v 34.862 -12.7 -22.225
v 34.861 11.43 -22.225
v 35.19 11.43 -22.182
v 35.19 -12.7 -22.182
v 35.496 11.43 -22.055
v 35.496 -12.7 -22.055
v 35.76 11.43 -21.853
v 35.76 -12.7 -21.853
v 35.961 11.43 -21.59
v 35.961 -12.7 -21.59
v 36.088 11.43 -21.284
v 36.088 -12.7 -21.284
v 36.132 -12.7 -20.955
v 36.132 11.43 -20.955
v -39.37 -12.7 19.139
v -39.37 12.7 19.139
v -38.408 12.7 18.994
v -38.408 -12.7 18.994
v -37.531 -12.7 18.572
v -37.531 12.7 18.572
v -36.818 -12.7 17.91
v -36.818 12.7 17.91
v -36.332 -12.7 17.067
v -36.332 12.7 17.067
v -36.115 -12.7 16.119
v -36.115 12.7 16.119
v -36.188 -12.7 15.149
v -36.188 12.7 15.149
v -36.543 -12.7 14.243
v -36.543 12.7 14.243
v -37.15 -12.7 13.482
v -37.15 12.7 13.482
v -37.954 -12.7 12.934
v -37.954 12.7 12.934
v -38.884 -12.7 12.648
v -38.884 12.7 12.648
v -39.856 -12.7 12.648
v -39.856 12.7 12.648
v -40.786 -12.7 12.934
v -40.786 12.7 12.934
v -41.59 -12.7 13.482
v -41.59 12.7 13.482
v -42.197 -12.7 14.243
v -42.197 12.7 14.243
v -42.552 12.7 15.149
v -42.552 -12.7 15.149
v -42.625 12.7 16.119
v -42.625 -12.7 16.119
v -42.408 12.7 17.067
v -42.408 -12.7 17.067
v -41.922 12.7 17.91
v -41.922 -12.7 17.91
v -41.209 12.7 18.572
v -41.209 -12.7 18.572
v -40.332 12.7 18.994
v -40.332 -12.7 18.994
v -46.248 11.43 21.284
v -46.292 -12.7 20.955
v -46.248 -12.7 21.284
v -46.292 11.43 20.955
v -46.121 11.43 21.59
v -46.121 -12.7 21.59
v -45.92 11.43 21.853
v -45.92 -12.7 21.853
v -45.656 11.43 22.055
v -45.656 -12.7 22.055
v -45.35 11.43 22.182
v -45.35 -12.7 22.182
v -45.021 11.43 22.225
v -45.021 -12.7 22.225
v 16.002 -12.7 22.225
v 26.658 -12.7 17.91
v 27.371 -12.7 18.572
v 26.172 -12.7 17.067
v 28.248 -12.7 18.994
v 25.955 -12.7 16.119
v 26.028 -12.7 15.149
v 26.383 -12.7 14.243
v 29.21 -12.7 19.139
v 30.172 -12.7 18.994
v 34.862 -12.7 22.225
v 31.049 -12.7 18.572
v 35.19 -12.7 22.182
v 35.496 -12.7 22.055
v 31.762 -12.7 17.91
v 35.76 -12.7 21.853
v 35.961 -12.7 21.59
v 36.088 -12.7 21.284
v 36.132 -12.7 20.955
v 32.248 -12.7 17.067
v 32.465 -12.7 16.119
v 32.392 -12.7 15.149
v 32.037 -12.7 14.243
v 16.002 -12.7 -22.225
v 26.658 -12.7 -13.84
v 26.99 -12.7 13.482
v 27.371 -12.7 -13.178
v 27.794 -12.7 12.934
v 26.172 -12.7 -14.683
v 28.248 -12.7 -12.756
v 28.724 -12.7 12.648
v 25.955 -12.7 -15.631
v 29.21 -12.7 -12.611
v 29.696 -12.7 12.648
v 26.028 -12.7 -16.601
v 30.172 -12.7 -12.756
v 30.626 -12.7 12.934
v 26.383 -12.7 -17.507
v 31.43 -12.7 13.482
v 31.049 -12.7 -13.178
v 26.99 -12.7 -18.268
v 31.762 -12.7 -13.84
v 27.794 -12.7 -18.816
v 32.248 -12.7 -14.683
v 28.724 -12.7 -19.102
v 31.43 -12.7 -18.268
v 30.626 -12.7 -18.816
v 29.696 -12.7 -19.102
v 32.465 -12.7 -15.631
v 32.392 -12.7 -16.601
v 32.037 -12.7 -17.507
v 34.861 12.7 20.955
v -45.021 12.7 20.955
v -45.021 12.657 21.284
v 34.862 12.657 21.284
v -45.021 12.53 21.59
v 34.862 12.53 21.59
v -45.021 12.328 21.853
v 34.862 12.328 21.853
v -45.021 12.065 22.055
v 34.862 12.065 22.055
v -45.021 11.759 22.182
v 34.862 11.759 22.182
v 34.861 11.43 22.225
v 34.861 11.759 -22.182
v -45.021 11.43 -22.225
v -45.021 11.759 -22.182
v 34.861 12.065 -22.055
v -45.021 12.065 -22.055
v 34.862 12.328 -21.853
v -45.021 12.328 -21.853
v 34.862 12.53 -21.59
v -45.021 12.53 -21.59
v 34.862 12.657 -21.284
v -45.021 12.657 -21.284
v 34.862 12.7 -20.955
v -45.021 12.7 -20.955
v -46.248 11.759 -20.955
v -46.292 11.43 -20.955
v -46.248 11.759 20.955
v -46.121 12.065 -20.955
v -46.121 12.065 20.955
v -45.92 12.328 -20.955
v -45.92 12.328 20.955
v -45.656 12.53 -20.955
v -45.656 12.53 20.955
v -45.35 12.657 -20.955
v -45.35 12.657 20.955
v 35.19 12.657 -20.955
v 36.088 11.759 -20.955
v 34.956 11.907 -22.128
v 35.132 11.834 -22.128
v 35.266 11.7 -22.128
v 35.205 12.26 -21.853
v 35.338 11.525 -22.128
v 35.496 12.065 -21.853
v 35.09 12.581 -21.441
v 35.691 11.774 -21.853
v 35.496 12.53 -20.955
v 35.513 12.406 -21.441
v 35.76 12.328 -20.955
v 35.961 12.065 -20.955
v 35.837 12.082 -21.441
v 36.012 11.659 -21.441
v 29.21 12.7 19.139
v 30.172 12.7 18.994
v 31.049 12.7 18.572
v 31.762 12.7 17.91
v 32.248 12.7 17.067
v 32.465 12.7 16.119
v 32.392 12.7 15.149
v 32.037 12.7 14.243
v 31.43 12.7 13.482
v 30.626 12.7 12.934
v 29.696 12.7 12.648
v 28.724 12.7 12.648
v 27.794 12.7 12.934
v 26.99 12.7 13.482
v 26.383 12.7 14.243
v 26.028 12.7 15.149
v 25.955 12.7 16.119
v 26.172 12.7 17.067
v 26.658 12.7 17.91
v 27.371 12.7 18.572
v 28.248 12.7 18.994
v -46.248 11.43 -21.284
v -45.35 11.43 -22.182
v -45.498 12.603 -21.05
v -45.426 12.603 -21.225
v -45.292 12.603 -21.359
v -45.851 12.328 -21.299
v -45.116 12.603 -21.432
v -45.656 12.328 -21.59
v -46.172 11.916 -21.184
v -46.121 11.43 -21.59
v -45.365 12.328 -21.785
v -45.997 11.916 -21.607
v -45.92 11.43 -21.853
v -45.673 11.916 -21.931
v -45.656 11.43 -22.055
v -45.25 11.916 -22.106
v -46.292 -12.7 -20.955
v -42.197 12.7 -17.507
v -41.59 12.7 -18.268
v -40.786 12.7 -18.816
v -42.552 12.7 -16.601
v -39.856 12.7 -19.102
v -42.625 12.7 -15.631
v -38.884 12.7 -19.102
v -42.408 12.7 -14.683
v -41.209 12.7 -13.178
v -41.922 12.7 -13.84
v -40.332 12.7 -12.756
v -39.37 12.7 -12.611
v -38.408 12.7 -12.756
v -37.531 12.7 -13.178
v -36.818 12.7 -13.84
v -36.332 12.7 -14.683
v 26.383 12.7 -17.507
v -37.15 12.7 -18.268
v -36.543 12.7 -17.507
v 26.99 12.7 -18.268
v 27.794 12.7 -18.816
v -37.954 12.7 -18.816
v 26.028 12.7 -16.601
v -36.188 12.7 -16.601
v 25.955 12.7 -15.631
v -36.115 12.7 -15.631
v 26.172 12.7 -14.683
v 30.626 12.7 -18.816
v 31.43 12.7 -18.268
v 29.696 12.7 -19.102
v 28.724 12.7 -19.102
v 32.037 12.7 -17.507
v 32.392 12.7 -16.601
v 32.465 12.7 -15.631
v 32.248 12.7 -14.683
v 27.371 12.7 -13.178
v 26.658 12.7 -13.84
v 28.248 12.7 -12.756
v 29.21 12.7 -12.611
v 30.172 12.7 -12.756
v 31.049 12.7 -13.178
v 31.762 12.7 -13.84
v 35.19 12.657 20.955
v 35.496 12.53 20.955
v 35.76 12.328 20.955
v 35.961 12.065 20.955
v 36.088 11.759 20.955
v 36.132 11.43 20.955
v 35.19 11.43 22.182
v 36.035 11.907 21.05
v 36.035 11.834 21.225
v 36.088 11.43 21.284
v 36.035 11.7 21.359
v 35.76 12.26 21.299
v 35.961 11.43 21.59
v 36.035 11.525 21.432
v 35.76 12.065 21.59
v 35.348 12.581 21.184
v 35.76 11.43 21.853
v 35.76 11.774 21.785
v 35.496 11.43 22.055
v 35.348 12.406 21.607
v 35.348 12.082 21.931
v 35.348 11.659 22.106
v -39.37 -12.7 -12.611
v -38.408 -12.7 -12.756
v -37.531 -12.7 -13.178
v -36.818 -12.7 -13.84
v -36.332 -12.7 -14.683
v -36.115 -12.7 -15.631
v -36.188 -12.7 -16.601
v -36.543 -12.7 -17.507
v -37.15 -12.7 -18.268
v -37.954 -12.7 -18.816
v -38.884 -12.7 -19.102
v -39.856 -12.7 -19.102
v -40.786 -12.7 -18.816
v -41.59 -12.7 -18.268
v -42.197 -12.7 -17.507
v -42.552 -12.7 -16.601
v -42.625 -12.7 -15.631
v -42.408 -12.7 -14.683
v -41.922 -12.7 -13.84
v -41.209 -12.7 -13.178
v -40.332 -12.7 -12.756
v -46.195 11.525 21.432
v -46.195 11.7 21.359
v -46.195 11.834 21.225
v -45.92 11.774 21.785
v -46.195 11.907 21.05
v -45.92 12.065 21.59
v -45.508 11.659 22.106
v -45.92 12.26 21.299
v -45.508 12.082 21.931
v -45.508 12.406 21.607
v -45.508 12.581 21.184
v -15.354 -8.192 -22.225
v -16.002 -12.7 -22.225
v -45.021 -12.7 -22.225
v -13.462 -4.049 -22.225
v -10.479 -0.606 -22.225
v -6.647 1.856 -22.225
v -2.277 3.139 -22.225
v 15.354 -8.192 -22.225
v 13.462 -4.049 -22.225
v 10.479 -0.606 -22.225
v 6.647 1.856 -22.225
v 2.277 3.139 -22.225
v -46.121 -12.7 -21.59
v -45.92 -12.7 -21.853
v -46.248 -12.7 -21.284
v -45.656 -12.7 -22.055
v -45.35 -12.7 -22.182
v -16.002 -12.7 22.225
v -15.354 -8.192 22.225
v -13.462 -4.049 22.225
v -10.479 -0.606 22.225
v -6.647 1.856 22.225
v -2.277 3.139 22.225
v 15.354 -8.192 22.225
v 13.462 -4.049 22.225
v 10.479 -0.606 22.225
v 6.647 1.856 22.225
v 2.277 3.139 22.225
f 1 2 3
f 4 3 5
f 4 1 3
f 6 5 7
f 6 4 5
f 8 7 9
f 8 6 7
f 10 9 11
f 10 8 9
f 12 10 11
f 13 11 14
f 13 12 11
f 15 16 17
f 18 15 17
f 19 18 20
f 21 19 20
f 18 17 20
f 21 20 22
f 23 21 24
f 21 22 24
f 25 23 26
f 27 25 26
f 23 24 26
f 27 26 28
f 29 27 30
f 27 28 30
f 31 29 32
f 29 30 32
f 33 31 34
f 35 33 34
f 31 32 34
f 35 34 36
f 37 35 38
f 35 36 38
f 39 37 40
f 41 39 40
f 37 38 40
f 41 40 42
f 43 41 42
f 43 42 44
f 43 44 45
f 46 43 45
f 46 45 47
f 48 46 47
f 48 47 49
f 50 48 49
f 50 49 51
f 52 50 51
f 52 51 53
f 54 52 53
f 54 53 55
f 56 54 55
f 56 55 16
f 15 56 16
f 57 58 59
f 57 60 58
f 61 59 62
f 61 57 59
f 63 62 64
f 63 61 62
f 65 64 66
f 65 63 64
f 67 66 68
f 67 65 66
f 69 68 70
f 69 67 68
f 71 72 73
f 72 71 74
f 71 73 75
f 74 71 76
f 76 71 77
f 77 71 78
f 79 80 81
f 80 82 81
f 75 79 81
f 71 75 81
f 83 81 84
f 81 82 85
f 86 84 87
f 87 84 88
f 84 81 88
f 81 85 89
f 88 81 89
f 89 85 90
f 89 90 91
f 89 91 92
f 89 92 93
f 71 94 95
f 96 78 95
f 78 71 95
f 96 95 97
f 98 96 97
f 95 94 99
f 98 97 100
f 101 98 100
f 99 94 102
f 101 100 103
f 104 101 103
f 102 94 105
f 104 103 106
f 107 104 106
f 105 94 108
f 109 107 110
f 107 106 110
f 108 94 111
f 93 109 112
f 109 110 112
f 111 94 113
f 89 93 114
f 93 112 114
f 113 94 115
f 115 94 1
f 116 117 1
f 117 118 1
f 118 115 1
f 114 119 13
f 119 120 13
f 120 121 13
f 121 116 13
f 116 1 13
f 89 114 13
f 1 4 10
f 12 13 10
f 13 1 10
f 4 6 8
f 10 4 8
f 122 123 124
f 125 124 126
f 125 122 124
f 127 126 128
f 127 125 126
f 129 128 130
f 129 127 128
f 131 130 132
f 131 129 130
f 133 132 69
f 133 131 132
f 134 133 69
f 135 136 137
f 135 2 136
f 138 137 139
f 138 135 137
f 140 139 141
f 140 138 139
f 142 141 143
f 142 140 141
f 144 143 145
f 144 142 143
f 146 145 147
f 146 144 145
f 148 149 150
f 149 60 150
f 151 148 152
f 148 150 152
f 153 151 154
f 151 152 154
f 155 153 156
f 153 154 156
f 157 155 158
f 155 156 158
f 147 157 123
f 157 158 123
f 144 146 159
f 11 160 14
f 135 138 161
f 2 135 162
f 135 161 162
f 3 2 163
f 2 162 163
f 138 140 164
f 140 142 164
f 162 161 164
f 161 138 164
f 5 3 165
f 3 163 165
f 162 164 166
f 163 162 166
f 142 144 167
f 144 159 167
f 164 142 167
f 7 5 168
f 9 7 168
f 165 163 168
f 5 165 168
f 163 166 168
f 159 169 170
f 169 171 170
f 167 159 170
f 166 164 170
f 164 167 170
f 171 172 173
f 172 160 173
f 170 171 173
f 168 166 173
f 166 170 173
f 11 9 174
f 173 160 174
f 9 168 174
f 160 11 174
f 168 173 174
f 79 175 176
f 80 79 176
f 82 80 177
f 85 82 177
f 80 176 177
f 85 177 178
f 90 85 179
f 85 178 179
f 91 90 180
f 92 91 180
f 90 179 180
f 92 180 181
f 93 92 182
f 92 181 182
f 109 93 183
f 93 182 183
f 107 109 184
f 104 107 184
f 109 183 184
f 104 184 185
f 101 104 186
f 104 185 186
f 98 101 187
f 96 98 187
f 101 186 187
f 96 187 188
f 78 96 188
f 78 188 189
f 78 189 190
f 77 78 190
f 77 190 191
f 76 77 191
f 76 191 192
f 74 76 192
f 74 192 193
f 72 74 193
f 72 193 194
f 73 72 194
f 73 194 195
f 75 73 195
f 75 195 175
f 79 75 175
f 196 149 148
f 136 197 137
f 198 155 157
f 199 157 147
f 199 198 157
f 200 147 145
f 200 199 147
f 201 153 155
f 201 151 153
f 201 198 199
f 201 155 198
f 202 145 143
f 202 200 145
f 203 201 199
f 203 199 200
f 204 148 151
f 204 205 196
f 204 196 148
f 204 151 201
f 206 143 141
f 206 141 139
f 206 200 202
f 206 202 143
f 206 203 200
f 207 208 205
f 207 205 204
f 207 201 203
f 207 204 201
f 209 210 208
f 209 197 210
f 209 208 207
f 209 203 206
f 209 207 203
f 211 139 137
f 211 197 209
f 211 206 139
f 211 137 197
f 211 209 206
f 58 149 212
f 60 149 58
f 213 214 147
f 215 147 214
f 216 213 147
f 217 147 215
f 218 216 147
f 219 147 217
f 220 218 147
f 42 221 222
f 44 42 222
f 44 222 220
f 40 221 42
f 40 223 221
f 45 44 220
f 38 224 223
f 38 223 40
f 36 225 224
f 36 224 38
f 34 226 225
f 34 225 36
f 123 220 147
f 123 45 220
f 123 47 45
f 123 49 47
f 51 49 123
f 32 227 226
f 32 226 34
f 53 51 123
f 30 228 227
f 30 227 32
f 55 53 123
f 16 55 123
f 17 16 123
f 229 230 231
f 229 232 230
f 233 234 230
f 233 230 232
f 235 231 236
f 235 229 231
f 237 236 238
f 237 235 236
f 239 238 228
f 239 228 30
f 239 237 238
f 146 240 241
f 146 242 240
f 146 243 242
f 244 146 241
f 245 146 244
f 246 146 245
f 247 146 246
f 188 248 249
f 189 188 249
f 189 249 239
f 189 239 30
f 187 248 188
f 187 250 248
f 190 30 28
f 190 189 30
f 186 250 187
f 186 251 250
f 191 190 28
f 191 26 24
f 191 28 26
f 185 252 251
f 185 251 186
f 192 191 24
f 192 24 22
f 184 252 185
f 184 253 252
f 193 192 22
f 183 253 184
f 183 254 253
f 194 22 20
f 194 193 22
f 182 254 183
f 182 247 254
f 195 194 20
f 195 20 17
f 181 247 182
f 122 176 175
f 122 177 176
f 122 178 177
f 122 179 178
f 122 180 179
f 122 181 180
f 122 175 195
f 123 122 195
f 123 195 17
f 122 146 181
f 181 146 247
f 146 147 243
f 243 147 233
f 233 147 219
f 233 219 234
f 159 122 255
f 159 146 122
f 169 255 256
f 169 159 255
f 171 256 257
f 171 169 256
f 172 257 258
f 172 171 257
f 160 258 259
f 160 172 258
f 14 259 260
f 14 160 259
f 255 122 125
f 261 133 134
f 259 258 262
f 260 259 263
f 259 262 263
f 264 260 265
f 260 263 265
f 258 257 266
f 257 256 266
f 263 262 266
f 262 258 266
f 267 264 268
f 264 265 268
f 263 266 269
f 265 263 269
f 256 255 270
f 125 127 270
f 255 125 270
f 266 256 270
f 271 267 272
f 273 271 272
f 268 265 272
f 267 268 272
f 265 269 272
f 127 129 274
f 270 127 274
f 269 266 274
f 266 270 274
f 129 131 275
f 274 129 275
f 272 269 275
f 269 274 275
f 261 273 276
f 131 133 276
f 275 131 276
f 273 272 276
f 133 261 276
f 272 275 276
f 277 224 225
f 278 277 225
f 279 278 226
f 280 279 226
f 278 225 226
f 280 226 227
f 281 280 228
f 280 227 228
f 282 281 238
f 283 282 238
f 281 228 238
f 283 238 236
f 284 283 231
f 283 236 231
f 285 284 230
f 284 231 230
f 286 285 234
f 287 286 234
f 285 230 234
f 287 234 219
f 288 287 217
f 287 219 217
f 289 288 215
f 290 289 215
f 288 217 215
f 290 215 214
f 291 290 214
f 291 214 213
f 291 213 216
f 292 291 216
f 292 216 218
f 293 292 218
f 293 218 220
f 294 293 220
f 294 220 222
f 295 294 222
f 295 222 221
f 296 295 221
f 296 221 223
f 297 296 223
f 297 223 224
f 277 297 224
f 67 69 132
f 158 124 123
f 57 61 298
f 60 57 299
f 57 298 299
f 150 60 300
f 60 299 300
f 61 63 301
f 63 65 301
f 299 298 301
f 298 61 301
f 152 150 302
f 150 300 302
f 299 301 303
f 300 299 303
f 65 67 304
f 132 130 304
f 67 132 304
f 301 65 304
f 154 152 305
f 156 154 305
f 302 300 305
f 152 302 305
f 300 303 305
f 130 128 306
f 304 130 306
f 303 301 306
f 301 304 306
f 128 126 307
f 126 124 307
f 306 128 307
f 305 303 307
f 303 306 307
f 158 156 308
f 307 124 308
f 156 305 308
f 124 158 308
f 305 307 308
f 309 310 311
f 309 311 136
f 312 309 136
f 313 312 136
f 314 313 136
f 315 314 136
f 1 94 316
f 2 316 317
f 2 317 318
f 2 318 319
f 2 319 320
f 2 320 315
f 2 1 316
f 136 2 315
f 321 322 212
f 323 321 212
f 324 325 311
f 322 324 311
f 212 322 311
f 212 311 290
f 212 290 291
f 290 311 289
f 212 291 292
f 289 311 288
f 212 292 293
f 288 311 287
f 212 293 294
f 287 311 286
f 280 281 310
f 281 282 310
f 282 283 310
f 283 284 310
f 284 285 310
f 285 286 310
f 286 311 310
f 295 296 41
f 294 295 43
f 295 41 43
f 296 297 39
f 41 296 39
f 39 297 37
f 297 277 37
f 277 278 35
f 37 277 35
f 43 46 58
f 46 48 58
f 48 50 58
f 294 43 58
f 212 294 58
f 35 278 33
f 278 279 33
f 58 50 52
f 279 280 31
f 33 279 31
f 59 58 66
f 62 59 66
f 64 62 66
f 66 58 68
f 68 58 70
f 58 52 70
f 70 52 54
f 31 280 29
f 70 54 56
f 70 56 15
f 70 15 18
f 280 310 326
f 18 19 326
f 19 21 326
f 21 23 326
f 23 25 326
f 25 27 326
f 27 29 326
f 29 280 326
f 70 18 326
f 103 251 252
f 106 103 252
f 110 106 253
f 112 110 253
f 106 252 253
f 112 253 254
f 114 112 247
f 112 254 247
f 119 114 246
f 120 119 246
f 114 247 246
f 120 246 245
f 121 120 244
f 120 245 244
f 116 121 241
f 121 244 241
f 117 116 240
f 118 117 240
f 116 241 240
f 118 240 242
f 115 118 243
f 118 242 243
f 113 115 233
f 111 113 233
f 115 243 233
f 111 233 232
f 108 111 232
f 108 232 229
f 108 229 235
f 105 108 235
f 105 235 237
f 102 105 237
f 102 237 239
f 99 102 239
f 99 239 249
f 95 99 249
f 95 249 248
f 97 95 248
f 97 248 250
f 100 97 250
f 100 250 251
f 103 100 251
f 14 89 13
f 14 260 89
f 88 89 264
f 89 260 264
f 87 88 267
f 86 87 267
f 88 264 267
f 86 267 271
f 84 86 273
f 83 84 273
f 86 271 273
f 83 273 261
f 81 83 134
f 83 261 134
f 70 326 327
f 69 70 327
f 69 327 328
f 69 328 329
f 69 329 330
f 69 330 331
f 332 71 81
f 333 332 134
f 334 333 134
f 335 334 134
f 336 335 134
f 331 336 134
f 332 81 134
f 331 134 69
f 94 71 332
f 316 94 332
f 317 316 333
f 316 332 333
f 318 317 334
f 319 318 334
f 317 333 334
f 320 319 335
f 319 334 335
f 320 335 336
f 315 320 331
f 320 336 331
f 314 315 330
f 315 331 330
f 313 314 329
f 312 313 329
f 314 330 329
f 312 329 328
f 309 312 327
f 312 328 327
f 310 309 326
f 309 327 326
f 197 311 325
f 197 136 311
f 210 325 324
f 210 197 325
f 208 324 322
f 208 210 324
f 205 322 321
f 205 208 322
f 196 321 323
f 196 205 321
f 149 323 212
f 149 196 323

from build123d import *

# Parameters (mm, degrees)
SKETCH1_W               = 72.263
SKETCH1_H               = 44.45
BOSS_EXTRUDE1_DEPTH     = 12.7
CUT_EXTRUDE1_DEPTH      = 59.673484576
SKETCH3_W               = 44.45
SKETCH3_H               = 25.4
BOSS_EXTRUDE2_DEPTH     = 10.16
F_1_4_CLEARANCE_HOLE1_D = 6.5278
FILLET8_R               = 1.27


with BuildPart() as part:
    # Sketch1 → Boss-Extrude1 (new, symmetric)
    with BuildSketch(Plane(origin=(0, 0, 0), x_dir=(1, 0, 0), z_dir=(0, 1, 0))):
        Rectangle(SKETCH1_W, SKETCH1_H)
    extrude(amount=BOSS_EXTRUDE1_DEPTH, both=True)

    # Sketch2 → Cut-Extrude1 (cut, through all)
    with BuildSketch(Plane.XY.offset(22.225)):
        with BuildLine():
            Line((-16.002, -12.7), (16.002, -12.7))
            ThreePointArc((16.002, -12.7), (0, 3.302), (-16.002, -12.7))
        make_face()
    extrude(amount=-CUT_EXTRUDE1_DEPTH, mode=Mode.SUBTRACT)

    # Sketch3 → Boss-Extrude2 (add)
    with BuildSketch(Plane.ZY.offset(36.1315)):
        Rectangle(SKETCH3_W, SKETCH3_H)
    extrude(amount=BOSS_EXTRUDE2_DEPTH)

    # 1/4 Clearance Hole1 (through all)
    with Locations(Plane(origin=(-39.37, -12.7, 15.875), x_dir=(0, 0, -1), z_dir=(0, -1, 0))):
        with Locations((0, 0), (0, 68.58), (31.75, 68.58), (31.75, 0)):
            Hole(F_1_4_CLEARANCE_HOLE1_D / 2)

    # Fillet8
    fillet8_edges = [part.edges().sort_by_distance(p)[0] for p in [
        (-5.08, 12.7, 22.225),
        (-46.2915, 0, -22.225),
        (-46.2915, 0, 22.225),
        (-46.2915, 12.7, 0),
        (36.1315, 12.7, 0),
        (-5.08, 12.7, -22.225),
        (36.1315, 0, 22.225),
        (36.1315, 0, -22.225),
    ]]
    fillet(fillet8_edges, radius=FILLET8_R)


solid = part.part
